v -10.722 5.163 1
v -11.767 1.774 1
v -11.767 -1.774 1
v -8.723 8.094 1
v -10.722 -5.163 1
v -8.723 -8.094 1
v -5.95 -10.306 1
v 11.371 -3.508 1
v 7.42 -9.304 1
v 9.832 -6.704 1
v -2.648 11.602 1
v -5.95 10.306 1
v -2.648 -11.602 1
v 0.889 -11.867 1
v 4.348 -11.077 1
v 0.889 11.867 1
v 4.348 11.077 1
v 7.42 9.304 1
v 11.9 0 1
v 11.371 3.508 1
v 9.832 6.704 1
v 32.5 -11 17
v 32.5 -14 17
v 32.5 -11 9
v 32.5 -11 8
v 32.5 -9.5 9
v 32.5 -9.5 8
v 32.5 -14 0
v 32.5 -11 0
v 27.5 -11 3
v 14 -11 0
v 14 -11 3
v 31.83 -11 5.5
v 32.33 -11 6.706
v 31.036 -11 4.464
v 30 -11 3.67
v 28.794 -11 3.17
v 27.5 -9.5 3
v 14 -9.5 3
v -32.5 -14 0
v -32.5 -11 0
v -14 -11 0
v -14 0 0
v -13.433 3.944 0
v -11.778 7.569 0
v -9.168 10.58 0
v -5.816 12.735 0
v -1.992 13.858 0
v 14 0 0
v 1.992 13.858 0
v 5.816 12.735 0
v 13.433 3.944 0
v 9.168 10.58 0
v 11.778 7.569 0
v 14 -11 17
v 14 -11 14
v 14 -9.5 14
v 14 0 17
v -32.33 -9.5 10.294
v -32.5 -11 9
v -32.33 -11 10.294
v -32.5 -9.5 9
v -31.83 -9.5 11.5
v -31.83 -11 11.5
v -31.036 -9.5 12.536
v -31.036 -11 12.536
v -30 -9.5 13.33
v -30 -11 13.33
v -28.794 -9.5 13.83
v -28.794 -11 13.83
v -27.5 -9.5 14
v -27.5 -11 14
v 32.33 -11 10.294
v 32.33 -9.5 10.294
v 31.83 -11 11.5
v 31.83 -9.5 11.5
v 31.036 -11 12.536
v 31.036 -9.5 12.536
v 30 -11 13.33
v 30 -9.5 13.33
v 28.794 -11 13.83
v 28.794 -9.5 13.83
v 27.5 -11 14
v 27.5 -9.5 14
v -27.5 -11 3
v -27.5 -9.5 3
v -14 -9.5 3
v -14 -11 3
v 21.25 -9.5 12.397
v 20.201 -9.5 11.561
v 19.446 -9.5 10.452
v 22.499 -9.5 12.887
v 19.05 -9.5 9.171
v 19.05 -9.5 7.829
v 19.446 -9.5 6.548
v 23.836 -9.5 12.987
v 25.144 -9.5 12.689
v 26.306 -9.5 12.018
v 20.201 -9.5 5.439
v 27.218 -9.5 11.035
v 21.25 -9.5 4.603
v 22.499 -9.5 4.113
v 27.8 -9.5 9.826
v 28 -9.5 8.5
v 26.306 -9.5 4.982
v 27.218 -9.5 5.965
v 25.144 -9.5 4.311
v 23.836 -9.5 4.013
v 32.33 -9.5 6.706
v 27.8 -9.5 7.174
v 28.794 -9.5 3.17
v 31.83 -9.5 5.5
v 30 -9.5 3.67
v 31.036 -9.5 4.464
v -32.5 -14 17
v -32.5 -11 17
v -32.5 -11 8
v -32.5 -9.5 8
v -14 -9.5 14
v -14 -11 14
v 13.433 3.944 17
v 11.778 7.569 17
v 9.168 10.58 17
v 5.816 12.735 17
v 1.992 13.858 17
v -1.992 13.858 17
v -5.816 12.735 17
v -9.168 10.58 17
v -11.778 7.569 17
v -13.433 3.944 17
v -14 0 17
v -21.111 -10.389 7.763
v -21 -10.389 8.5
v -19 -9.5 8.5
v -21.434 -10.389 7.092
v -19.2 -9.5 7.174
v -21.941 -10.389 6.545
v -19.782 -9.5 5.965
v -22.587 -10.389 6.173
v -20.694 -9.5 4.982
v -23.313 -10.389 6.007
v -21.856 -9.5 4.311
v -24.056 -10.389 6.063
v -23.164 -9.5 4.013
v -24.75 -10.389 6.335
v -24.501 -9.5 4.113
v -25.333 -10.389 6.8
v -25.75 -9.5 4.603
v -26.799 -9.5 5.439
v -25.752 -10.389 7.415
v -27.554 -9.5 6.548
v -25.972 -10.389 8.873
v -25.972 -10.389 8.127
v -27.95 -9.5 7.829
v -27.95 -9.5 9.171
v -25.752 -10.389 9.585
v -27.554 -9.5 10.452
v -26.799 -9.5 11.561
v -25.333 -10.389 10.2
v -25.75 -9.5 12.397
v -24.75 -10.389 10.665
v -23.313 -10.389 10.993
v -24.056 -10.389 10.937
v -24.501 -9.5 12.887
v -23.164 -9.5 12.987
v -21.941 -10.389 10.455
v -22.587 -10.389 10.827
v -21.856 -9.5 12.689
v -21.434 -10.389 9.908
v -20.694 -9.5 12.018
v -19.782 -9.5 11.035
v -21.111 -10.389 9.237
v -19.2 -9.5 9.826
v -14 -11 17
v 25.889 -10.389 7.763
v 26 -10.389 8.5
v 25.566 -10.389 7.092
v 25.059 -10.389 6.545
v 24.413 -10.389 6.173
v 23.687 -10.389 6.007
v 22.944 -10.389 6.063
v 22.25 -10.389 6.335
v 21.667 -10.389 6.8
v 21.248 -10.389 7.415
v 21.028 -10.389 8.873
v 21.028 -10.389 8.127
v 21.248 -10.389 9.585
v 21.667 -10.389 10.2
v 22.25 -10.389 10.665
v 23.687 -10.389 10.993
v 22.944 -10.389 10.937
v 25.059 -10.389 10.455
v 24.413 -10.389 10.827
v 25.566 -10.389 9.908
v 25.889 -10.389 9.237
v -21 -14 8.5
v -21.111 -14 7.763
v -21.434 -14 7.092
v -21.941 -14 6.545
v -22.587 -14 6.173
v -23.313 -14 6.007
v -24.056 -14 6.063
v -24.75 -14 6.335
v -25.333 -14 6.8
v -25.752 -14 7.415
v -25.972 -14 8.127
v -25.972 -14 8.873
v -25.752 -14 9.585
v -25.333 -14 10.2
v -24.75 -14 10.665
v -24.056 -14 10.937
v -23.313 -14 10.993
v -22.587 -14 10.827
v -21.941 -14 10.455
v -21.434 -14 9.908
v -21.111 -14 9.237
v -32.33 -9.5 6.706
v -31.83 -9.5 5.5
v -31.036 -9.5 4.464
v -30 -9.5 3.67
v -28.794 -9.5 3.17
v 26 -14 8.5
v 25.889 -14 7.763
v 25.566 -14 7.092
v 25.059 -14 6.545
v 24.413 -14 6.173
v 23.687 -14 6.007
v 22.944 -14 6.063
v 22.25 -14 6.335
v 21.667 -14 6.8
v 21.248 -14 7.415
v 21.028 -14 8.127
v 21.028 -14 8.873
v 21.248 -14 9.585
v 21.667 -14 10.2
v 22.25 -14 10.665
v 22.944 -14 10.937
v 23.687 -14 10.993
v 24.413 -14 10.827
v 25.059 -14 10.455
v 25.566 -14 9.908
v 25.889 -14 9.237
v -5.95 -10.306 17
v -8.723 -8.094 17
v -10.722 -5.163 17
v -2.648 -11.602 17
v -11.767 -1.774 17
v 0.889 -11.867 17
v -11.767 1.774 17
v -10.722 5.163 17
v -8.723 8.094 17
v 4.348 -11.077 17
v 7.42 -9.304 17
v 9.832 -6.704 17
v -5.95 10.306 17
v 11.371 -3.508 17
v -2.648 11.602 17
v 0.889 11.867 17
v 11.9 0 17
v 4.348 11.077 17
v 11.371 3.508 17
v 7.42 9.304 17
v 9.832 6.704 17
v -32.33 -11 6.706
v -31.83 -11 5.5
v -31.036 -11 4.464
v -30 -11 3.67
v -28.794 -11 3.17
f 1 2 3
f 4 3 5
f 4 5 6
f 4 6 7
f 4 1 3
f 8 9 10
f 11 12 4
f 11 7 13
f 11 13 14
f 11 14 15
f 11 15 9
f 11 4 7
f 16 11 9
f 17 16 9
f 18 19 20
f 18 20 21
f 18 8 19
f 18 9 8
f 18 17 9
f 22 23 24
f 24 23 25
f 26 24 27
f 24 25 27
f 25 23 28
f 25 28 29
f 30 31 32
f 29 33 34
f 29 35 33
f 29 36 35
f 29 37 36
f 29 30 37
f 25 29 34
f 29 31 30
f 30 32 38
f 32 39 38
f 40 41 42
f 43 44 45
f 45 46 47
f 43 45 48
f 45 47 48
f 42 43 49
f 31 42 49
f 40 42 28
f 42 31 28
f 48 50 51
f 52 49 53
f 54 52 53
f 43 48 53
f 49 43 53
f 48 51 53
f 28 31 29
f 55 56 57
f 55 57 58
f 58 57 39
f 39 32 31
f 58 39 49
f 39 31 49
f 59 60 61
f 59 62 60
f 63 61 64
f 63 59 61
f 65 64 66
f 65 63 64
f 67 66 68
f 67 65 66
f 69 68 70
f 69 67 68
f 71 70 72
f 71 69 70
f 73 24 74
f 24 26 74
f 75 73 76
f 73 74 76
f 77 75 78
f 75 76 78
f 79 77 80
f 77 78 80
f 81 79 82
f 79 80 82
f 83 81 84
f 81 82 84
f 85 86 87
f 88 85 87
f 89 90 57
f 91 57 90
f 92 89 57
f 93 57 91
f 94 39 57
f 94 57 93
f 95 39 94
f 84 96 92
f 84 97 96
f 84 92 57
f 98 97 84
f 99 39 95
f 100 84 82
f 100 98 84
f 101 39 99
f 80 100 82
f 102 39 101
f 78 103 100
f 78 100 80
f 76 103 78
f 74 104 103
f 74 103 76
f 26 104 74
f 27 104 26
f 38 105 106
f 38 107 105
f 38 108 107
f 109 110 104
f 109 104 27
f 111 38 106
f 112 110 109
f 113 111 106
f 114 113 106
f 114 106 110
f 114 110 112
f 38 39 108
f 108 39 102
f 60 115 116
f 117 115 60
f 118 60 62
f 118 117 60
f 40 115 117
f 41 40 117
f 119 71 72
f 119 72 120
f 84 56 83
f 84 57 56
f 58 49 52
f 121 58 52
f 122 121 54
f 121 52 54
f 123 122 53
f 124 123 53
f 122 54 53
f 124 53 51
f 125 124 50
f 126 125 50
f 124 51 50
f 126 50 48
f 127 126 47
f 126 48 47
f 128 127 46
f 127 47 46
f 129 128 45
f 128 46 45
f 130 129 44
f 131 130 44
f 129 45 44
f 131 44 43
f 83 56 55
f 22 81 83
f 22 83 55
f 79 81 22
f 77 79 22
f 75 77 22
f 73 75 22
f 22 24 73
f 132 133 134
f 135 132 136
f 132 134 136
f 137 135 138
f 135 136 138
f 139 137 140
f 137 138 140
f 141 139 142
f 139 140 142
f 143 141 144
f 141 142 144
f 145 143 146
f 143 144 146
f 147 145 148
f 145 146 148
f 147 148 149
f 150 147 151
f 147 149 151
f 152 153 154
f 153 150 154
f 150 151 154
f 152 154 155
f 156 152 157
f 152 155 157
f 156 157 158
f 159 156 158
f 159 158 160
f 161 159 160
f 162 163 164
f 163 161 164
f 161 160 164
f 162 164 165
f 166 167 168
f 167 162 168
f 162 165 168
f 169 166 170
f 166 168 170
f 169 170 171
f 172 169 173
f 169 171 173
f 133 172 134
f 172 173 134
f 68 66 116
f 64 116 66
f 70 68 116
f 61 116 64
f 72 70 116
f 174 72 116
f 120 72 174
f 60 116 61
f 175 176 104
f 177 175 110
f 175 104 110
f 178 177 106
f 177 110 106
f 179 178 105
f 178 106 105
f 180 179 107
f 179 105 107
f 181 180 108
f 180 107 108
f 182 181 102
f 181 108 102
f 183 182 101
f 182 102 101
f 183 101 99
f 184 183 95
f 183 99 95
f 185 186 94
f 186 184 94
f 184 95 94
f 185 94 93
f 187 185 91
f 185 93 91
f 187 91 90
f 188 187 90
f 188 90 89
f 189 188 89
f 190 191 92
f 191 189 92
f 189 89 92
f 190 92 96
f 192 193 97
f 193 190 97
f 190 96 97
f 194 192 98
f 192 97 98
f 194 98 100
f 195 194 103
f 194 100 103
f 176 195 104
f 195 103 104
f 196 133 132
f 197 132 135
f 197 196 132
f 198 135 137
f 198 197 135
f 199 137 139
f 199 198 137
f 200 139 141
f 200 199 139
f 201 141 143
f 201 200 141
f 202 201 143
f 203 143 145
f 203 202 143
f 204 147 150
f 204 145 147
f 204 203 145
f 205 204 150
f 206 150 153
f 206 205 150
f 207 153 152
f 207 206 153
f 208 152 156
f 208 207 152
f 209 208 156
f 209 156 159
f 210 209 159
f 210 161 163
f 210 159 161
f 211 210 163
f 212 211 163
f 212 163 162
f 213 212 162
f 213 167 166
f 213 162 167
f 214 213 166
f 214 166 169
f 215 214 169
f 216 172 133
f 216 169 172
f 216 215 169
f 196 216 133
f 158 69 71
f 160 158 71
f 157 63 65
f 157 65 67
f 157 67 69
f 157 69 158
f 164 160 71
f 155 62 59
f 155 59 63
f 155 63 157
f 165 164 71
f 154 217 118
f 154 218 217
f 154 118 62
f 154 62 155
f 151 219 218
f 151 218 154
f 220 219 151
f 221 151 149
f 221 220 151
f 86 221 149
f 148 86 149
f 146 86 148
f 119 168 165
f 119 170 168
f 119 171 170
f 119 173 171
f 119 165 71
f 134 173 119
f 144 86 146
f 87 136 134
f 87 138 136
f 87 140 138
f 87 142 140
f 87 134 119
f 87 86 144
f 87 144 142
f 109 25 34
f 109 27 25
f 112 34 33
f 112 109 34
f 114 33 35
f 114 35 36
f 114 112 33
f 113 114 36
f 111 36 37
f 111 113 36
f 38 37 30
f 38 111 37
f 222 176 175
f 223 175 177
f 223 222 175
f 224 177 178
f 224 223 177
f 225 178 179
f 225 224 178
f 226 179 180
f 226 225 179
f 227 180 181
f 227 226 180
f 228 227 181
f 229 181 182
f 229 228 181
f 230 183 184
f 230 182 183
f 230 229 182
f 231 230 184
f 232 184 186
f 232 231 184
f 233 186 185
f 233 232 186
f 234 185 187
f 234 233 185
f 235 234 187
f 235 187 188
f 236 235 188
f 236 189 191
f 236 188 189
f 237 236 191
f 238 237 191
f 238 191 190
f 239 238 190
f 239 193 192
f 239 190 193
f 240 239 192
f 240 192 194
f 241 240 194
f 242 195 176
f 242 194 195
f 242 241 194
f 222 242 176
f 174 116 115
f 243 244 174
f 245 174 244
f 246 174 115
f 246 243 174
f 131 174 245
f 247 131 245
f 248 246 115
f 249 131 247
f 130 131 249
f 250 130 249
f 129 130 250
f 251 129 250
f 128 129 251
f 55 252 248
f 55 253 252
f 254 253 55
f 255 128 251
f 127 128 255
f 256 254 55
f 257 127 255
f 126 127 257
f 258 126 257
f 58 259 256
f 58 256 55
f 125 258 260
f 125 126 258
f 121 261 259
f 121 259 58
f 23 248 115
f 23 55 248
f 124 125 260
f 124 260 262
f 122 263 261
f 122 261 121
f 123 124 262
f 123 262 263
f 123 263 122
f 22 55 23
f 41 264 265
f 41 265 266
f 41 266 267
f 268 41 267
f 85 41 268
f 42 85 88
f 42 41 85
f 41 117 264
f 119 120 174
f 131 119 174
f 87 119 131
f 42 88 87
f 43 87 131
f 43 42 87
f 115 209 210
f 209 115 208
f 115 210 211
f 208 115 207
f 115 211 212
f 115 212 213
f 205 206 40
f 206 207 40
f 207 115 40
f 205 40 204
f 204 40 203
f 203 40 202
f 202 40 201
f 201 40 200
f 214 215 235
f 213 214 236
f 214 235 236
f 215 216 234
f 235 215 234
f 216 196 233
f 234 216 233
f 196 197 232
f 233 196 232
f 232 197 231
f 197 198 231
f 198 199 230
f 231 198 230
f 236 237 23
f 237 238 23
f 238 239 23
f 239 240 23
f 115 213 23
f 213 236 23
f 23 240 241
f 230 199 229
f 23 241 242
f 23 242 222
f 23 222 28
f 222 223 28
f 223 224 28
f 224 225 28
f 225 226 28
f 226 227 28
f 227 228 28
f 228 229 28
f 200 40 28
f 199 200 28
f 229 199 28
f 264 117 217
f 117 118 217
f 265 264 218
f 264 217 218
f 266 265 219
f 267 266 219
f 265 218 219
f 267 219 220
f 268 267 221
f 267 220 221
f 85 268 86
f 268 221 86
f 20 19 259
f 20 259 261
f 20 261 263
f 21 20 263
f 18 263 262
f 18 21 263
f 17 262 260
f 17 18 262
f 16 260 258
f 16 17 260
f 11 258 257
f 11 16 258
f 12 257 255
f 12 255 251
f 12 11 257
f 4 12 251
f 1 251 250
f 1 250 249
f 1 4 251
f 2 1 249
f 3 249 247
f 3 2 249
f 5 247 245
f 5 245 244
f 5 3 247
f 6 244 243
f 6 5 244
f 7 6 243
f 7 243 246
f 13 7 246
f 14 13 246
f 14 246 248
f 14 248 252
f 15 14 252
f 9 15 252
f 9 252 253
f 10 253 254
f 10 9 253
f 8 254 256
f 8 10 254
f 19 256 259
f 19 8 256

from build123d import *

# Parameters (mm, degrees)
CYLINDER001_R     = 2.5
CYLINDER001_DEPTH = 10
CYLINDER003_R     = 11.9
CYLINDER003_DEPTH = 16
CYLINDER002_R     = 2.5
CYLINDER002_DEPTH = 10
CYLINDER_R        = 14
CYLINDER_DEPTH    = 17
BOX_W             = 65
BOX_H             = 3
BOX_DEPTH         = 17
BOX001_W          = 65
BOX001_H          = 4
BOX001_DEPTH      = 11
BOX002_W          = 28
BOX002_H          = 13
BOX002_DEPTH      = 17
FILLET_R          = 5


with BuildPart() as cylinder001:
    # Cylinder001 → Cylinder001 (new body)
    with BuildSketch(Plane(origin=(-23.5, -14, 8.5), x_dir=(1, 0, 0), z_dir=(0, 1, 0))):
        Circle(CYLINDER001_R)
    extrude(amount=CYLINDER001_DEPTH)


with BuildPart() as cylinder003:
    # Cylinder003 → Cylinder003 (new body)
    with BuildSketch(Plane.XY.offset(1)):
        Circle(CYLINDER003_R)
    extrude(amount=CYLINDER003_DEPTH)


with BuildPart() as cone:
    # Cone → Cone (revolve)
    with BuildSketch(Plane(origin=(23.5, -11.5, 8.5), x_dir=(1, 0, 0), z_dir=(0, 0, 1))):
        Polygon((0, 0), (4.5, 2), (0, 2), align=None)
    revolve(axis=Axis((23.5, -11.5, 8.5), (0, 1, 0)))


with BuildPart() as cone001:
    # Cone001 → Cone001 (revolve)
    with BuildSketch(Plane(origin=(-23.5, -11.5, 8.5), x_dir=(1, 0, 0), z_dir=(0, 0, 1))):
        Polygon((0, 0), (4.5, 2), (0, 2), align=None)
    revolve(axis=Axis((-23.5, -11.5, 8.5), (0, 1, 0)))


with BuildPart() as fusion:
    # Cylinder002 → Cylinder002 (new body)
    with BuildSketch(Plane(origin=(23.5, -14, 8.5), x_dir=(1, 0, 0), z_dir=(0, 1, 0))):
        Circle(CYLINDER002_R)
    extrude(amount=CYLINDER002_DEPTH)

    # Fusion: union Cylinder001, Cylinder003, Cone, Cone001
    add(cylinder001.part)
    add(cylinder003.part)
    add(cone.part)
    add(cone001.part)


with BuildPart() as cylinder:
    # Cylinder → Cylinder (new body)
    with BuildSketch(Plane.XY):
        Circle(CYLINDER_R)
    extrude(amount=CYLINDER_DEPTH)


with BuildPart() as box:
    # Box → Box (new body)
    with BuildSketch(Plane(origin=(-32.5, -14, 0), x_dir=(1, 0, 0), z_dir=(0, 0, 1))):
        with Locations((32.5, 1.5)):
            Rectangle(BOX_W, BOX_H)
    extrude(amount=BOX_DEPTH)


with BuildPart() as box001:
    # Box001 → Box001 (new body)
    with BuildSketch(Plane(origin=(-32.5, -13.5, 3), x_dir=(1, 0, 0), z_dir=(0, 0, 1))):
        with Locations((32.5, 2)):
            Rectangle(BOX001_W, BOX001_H)
    extrude(amount=BOX001_DEPTH)


with BuildPart() as fillet_body:
    # Box002 → Box002 (new body)
    with BuildSketch(Plane(origin=(-14, -13, 0), x_dir=(1, 0, 0), z_dir=(0, 0, 1))):
        with Locations((14, 6.5)):
            Rectangle(BOX002_W, BOX002_H)
    extrude(amount=BOX002_DEPTH)

    # Fusion001: union Cylinder, Box, Box001
    add(cylinder.part)
    add(box.part)
    add(box001.part)

    # Cut: cut Fusion
    add(fusion.part, mode=Mode.SUBTRACT)

    # Fillet
    fillet_edges = [fillet_body.edges().sort_by_distance(p)[0] for p in [
        (32.5, -10.25, 3),
        (32.5, -10.25, 14),
        (-32.5, -10.25, 14),
        (-32.5, -10.25, 3),
    ]]
    fillet(fillet_edges, radius=FILLET_R)


solid = fillet_body.part
